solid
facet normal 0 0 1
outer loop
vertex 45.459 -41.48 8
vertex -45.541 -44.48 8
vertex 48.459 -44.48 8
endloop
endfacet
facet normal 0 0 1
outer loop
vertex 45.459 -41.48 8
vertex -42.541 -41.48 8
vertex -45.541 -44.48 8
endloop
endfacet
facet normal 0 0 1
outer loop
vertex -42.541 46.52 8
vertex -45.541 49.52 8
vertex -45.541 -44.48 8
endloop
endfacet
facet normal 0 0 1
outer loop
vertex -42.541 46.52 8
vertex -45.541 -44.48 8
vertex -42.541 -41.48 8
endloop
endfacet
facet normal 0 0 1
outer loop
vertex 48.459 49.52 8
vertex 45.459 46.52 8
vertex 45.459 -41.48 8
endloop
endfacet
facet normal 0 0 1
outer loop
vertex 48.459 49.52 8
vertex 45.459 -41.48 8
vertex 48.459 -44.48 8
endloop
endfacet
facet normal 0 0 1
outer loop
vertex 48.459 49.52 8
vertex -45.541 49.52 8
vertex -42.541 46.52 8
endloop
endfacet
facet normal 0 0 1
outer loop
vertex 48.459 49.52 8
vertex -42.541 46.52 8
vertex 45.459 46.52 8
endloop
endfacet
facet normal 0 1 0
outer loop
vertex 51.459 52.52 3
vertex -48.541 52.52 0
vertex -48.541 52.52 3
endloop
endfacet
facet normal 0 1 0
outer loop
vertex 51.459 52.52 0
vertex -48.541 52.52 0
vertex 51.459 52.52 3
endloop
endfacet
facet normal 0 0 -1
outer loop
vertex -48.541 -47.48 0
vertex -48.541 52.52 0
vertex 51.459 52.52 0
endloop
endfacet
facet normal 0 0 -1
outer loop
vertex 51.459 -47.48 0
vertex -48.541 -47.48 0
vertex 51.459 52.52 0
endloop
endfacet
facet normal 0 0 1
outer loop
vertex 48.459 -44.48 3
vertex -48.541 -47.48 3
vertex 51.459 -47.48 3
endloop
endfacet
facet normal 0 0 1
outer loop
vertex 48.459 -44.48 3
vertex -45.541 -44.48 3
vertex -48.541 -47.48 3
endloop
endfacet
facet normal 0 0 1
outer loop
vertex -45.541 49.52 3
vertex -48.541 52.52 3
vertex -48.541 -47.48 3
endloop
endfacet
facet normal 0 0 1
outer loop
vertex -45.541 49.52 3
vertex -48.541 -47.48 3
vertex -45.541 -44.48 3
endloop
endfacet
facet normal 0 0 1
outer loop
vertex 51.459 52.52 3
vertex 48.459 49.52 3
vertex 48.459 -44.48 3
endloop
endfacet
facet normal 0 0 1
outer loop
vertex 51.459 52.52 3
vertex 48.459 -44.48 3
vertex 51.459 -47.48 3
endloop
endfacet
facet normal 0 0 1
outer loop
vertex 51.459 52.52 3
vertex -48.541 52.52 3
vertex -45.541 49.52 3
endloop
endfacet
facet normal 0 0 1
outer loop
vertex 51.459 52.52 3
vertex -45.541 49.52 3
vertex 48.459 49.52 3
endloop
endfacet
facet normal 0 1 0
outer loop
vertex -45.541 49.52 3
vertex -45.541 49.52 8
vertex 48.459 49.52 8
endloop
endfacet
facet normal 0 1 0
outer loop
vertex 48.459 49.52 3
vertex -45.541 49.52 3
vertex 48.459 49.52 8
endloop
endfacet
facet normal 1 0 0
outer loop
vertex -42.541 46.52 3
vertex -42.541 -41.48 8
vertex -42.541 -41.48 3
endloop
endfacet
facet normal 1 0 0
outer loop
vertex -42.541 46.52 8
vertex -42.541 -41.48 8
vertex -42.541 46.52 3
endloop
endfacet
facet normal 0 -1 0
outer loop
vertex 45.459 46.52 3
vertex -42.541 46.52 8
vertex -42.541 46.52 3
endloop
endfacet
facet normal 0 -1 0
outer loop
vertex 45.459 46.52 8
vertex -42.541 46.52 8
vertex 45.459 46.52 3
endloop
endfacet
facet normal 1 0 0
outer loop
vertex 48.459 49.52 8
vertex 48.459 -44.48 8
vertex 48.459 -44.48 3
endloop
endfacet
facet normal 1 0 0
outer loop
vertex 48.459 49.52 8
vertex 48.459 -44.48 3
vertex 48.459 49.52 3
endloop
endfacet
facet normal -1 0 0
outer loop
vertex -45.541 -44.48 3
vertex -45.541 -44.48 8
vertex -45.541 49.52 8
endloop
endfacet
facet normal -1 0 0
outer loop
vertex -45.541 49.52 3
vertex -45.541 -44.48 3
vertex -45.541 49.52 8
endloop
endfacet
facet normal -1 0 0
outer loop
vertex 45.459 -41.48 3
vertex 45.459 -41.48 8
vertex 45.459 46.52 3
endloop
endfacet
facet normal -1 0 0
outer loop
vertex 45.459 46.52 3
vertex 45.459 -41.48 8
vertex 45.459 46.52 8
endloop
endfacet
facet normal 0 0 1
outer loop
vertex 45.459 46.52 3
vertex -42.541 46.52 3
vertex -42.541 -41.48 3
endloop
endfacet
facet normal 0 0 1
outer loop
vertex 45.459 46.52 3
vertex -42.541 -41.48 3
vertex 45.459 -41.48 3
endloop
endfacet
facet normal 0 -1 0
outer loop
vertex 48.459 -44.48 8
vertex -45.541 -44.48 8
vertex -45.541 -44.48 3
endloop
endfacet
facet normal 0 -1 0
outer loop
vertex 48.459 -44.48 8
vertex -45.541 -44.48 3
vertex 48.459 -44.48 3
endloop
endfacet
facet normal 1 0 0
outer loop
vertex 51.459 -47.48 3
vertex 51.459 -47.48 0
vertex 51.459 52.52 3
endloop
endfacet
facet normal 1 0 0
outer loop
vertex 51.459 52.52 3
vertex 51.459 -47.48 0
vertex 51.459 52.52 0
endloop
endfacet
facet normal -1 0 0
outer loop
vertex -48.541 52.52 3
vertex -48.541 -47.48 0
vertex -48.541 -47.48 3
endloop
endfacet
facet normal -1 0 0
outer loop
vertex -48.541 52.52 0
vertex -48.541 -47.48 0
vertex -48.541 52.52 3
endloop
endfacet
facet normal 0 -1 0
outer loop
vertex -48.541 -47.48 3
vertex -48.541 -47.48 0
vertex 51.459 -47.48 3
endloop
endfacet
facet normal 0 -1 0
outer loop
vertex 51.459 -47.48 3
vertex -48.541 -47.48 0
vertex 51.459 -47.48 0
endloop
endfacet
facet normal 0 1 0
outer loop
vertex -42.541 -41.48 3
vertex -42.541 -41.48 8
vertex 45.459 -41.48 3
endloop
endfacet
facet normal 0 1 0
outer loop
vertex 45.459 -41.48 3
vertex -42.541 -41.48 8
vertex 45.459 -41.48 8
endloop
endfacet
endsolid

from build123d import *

# Parameters (mm, degrees)
SKETCH_1_W          = 100
SKETCH_1_H          = 100
EXTRUDE_3_DEPTH     = 8
SKETCH_4_W          = 100
SKETCH_4_H          = 100
SKETCH_4_W_2        = 94
SKETCH_4_H_2        = 94
SKETCH_4_W_3        = 88
SKETCH_4_H_3        = 88
CUT_EXTRUDE_3_DEPTH = 5


with BuildPart() as part:
    # 草图1 → 凸台-拉伸3 (new body)
    with BuildSketch(Plane.XY):
        with Locations((1.458885942, 2.519893899)):
            Rectangle(SKETCH_1_W, SKETCH_1_H)
    extrude(amount=EXTRUDE_3_DEPTH)

    # 草图4 → 切除-拉伸3 (cut)
    with BuildSketch(Plane.XY.offset(8)):
        with Locations((1.458885942, 2.519893899)):
            Rectangle(SKETCH_4_W, SKETCH_4_H)
        with Locations((1.458885942, 2.519893899)):
            Rectangle(SKETCH_4_W_2, SKETCH_4_H_2, mode=Mode.SUBTRACT)
        with Locations((1.458885942, 2.519893899)):
            Rectangle(SKETCH_4_W_3, SKETCH_4_H_3)
    extrude(amount=-CUT_EXTRUDE_3_DEPTH, mode=Mode.SUBTRACT)


solid = part.part
